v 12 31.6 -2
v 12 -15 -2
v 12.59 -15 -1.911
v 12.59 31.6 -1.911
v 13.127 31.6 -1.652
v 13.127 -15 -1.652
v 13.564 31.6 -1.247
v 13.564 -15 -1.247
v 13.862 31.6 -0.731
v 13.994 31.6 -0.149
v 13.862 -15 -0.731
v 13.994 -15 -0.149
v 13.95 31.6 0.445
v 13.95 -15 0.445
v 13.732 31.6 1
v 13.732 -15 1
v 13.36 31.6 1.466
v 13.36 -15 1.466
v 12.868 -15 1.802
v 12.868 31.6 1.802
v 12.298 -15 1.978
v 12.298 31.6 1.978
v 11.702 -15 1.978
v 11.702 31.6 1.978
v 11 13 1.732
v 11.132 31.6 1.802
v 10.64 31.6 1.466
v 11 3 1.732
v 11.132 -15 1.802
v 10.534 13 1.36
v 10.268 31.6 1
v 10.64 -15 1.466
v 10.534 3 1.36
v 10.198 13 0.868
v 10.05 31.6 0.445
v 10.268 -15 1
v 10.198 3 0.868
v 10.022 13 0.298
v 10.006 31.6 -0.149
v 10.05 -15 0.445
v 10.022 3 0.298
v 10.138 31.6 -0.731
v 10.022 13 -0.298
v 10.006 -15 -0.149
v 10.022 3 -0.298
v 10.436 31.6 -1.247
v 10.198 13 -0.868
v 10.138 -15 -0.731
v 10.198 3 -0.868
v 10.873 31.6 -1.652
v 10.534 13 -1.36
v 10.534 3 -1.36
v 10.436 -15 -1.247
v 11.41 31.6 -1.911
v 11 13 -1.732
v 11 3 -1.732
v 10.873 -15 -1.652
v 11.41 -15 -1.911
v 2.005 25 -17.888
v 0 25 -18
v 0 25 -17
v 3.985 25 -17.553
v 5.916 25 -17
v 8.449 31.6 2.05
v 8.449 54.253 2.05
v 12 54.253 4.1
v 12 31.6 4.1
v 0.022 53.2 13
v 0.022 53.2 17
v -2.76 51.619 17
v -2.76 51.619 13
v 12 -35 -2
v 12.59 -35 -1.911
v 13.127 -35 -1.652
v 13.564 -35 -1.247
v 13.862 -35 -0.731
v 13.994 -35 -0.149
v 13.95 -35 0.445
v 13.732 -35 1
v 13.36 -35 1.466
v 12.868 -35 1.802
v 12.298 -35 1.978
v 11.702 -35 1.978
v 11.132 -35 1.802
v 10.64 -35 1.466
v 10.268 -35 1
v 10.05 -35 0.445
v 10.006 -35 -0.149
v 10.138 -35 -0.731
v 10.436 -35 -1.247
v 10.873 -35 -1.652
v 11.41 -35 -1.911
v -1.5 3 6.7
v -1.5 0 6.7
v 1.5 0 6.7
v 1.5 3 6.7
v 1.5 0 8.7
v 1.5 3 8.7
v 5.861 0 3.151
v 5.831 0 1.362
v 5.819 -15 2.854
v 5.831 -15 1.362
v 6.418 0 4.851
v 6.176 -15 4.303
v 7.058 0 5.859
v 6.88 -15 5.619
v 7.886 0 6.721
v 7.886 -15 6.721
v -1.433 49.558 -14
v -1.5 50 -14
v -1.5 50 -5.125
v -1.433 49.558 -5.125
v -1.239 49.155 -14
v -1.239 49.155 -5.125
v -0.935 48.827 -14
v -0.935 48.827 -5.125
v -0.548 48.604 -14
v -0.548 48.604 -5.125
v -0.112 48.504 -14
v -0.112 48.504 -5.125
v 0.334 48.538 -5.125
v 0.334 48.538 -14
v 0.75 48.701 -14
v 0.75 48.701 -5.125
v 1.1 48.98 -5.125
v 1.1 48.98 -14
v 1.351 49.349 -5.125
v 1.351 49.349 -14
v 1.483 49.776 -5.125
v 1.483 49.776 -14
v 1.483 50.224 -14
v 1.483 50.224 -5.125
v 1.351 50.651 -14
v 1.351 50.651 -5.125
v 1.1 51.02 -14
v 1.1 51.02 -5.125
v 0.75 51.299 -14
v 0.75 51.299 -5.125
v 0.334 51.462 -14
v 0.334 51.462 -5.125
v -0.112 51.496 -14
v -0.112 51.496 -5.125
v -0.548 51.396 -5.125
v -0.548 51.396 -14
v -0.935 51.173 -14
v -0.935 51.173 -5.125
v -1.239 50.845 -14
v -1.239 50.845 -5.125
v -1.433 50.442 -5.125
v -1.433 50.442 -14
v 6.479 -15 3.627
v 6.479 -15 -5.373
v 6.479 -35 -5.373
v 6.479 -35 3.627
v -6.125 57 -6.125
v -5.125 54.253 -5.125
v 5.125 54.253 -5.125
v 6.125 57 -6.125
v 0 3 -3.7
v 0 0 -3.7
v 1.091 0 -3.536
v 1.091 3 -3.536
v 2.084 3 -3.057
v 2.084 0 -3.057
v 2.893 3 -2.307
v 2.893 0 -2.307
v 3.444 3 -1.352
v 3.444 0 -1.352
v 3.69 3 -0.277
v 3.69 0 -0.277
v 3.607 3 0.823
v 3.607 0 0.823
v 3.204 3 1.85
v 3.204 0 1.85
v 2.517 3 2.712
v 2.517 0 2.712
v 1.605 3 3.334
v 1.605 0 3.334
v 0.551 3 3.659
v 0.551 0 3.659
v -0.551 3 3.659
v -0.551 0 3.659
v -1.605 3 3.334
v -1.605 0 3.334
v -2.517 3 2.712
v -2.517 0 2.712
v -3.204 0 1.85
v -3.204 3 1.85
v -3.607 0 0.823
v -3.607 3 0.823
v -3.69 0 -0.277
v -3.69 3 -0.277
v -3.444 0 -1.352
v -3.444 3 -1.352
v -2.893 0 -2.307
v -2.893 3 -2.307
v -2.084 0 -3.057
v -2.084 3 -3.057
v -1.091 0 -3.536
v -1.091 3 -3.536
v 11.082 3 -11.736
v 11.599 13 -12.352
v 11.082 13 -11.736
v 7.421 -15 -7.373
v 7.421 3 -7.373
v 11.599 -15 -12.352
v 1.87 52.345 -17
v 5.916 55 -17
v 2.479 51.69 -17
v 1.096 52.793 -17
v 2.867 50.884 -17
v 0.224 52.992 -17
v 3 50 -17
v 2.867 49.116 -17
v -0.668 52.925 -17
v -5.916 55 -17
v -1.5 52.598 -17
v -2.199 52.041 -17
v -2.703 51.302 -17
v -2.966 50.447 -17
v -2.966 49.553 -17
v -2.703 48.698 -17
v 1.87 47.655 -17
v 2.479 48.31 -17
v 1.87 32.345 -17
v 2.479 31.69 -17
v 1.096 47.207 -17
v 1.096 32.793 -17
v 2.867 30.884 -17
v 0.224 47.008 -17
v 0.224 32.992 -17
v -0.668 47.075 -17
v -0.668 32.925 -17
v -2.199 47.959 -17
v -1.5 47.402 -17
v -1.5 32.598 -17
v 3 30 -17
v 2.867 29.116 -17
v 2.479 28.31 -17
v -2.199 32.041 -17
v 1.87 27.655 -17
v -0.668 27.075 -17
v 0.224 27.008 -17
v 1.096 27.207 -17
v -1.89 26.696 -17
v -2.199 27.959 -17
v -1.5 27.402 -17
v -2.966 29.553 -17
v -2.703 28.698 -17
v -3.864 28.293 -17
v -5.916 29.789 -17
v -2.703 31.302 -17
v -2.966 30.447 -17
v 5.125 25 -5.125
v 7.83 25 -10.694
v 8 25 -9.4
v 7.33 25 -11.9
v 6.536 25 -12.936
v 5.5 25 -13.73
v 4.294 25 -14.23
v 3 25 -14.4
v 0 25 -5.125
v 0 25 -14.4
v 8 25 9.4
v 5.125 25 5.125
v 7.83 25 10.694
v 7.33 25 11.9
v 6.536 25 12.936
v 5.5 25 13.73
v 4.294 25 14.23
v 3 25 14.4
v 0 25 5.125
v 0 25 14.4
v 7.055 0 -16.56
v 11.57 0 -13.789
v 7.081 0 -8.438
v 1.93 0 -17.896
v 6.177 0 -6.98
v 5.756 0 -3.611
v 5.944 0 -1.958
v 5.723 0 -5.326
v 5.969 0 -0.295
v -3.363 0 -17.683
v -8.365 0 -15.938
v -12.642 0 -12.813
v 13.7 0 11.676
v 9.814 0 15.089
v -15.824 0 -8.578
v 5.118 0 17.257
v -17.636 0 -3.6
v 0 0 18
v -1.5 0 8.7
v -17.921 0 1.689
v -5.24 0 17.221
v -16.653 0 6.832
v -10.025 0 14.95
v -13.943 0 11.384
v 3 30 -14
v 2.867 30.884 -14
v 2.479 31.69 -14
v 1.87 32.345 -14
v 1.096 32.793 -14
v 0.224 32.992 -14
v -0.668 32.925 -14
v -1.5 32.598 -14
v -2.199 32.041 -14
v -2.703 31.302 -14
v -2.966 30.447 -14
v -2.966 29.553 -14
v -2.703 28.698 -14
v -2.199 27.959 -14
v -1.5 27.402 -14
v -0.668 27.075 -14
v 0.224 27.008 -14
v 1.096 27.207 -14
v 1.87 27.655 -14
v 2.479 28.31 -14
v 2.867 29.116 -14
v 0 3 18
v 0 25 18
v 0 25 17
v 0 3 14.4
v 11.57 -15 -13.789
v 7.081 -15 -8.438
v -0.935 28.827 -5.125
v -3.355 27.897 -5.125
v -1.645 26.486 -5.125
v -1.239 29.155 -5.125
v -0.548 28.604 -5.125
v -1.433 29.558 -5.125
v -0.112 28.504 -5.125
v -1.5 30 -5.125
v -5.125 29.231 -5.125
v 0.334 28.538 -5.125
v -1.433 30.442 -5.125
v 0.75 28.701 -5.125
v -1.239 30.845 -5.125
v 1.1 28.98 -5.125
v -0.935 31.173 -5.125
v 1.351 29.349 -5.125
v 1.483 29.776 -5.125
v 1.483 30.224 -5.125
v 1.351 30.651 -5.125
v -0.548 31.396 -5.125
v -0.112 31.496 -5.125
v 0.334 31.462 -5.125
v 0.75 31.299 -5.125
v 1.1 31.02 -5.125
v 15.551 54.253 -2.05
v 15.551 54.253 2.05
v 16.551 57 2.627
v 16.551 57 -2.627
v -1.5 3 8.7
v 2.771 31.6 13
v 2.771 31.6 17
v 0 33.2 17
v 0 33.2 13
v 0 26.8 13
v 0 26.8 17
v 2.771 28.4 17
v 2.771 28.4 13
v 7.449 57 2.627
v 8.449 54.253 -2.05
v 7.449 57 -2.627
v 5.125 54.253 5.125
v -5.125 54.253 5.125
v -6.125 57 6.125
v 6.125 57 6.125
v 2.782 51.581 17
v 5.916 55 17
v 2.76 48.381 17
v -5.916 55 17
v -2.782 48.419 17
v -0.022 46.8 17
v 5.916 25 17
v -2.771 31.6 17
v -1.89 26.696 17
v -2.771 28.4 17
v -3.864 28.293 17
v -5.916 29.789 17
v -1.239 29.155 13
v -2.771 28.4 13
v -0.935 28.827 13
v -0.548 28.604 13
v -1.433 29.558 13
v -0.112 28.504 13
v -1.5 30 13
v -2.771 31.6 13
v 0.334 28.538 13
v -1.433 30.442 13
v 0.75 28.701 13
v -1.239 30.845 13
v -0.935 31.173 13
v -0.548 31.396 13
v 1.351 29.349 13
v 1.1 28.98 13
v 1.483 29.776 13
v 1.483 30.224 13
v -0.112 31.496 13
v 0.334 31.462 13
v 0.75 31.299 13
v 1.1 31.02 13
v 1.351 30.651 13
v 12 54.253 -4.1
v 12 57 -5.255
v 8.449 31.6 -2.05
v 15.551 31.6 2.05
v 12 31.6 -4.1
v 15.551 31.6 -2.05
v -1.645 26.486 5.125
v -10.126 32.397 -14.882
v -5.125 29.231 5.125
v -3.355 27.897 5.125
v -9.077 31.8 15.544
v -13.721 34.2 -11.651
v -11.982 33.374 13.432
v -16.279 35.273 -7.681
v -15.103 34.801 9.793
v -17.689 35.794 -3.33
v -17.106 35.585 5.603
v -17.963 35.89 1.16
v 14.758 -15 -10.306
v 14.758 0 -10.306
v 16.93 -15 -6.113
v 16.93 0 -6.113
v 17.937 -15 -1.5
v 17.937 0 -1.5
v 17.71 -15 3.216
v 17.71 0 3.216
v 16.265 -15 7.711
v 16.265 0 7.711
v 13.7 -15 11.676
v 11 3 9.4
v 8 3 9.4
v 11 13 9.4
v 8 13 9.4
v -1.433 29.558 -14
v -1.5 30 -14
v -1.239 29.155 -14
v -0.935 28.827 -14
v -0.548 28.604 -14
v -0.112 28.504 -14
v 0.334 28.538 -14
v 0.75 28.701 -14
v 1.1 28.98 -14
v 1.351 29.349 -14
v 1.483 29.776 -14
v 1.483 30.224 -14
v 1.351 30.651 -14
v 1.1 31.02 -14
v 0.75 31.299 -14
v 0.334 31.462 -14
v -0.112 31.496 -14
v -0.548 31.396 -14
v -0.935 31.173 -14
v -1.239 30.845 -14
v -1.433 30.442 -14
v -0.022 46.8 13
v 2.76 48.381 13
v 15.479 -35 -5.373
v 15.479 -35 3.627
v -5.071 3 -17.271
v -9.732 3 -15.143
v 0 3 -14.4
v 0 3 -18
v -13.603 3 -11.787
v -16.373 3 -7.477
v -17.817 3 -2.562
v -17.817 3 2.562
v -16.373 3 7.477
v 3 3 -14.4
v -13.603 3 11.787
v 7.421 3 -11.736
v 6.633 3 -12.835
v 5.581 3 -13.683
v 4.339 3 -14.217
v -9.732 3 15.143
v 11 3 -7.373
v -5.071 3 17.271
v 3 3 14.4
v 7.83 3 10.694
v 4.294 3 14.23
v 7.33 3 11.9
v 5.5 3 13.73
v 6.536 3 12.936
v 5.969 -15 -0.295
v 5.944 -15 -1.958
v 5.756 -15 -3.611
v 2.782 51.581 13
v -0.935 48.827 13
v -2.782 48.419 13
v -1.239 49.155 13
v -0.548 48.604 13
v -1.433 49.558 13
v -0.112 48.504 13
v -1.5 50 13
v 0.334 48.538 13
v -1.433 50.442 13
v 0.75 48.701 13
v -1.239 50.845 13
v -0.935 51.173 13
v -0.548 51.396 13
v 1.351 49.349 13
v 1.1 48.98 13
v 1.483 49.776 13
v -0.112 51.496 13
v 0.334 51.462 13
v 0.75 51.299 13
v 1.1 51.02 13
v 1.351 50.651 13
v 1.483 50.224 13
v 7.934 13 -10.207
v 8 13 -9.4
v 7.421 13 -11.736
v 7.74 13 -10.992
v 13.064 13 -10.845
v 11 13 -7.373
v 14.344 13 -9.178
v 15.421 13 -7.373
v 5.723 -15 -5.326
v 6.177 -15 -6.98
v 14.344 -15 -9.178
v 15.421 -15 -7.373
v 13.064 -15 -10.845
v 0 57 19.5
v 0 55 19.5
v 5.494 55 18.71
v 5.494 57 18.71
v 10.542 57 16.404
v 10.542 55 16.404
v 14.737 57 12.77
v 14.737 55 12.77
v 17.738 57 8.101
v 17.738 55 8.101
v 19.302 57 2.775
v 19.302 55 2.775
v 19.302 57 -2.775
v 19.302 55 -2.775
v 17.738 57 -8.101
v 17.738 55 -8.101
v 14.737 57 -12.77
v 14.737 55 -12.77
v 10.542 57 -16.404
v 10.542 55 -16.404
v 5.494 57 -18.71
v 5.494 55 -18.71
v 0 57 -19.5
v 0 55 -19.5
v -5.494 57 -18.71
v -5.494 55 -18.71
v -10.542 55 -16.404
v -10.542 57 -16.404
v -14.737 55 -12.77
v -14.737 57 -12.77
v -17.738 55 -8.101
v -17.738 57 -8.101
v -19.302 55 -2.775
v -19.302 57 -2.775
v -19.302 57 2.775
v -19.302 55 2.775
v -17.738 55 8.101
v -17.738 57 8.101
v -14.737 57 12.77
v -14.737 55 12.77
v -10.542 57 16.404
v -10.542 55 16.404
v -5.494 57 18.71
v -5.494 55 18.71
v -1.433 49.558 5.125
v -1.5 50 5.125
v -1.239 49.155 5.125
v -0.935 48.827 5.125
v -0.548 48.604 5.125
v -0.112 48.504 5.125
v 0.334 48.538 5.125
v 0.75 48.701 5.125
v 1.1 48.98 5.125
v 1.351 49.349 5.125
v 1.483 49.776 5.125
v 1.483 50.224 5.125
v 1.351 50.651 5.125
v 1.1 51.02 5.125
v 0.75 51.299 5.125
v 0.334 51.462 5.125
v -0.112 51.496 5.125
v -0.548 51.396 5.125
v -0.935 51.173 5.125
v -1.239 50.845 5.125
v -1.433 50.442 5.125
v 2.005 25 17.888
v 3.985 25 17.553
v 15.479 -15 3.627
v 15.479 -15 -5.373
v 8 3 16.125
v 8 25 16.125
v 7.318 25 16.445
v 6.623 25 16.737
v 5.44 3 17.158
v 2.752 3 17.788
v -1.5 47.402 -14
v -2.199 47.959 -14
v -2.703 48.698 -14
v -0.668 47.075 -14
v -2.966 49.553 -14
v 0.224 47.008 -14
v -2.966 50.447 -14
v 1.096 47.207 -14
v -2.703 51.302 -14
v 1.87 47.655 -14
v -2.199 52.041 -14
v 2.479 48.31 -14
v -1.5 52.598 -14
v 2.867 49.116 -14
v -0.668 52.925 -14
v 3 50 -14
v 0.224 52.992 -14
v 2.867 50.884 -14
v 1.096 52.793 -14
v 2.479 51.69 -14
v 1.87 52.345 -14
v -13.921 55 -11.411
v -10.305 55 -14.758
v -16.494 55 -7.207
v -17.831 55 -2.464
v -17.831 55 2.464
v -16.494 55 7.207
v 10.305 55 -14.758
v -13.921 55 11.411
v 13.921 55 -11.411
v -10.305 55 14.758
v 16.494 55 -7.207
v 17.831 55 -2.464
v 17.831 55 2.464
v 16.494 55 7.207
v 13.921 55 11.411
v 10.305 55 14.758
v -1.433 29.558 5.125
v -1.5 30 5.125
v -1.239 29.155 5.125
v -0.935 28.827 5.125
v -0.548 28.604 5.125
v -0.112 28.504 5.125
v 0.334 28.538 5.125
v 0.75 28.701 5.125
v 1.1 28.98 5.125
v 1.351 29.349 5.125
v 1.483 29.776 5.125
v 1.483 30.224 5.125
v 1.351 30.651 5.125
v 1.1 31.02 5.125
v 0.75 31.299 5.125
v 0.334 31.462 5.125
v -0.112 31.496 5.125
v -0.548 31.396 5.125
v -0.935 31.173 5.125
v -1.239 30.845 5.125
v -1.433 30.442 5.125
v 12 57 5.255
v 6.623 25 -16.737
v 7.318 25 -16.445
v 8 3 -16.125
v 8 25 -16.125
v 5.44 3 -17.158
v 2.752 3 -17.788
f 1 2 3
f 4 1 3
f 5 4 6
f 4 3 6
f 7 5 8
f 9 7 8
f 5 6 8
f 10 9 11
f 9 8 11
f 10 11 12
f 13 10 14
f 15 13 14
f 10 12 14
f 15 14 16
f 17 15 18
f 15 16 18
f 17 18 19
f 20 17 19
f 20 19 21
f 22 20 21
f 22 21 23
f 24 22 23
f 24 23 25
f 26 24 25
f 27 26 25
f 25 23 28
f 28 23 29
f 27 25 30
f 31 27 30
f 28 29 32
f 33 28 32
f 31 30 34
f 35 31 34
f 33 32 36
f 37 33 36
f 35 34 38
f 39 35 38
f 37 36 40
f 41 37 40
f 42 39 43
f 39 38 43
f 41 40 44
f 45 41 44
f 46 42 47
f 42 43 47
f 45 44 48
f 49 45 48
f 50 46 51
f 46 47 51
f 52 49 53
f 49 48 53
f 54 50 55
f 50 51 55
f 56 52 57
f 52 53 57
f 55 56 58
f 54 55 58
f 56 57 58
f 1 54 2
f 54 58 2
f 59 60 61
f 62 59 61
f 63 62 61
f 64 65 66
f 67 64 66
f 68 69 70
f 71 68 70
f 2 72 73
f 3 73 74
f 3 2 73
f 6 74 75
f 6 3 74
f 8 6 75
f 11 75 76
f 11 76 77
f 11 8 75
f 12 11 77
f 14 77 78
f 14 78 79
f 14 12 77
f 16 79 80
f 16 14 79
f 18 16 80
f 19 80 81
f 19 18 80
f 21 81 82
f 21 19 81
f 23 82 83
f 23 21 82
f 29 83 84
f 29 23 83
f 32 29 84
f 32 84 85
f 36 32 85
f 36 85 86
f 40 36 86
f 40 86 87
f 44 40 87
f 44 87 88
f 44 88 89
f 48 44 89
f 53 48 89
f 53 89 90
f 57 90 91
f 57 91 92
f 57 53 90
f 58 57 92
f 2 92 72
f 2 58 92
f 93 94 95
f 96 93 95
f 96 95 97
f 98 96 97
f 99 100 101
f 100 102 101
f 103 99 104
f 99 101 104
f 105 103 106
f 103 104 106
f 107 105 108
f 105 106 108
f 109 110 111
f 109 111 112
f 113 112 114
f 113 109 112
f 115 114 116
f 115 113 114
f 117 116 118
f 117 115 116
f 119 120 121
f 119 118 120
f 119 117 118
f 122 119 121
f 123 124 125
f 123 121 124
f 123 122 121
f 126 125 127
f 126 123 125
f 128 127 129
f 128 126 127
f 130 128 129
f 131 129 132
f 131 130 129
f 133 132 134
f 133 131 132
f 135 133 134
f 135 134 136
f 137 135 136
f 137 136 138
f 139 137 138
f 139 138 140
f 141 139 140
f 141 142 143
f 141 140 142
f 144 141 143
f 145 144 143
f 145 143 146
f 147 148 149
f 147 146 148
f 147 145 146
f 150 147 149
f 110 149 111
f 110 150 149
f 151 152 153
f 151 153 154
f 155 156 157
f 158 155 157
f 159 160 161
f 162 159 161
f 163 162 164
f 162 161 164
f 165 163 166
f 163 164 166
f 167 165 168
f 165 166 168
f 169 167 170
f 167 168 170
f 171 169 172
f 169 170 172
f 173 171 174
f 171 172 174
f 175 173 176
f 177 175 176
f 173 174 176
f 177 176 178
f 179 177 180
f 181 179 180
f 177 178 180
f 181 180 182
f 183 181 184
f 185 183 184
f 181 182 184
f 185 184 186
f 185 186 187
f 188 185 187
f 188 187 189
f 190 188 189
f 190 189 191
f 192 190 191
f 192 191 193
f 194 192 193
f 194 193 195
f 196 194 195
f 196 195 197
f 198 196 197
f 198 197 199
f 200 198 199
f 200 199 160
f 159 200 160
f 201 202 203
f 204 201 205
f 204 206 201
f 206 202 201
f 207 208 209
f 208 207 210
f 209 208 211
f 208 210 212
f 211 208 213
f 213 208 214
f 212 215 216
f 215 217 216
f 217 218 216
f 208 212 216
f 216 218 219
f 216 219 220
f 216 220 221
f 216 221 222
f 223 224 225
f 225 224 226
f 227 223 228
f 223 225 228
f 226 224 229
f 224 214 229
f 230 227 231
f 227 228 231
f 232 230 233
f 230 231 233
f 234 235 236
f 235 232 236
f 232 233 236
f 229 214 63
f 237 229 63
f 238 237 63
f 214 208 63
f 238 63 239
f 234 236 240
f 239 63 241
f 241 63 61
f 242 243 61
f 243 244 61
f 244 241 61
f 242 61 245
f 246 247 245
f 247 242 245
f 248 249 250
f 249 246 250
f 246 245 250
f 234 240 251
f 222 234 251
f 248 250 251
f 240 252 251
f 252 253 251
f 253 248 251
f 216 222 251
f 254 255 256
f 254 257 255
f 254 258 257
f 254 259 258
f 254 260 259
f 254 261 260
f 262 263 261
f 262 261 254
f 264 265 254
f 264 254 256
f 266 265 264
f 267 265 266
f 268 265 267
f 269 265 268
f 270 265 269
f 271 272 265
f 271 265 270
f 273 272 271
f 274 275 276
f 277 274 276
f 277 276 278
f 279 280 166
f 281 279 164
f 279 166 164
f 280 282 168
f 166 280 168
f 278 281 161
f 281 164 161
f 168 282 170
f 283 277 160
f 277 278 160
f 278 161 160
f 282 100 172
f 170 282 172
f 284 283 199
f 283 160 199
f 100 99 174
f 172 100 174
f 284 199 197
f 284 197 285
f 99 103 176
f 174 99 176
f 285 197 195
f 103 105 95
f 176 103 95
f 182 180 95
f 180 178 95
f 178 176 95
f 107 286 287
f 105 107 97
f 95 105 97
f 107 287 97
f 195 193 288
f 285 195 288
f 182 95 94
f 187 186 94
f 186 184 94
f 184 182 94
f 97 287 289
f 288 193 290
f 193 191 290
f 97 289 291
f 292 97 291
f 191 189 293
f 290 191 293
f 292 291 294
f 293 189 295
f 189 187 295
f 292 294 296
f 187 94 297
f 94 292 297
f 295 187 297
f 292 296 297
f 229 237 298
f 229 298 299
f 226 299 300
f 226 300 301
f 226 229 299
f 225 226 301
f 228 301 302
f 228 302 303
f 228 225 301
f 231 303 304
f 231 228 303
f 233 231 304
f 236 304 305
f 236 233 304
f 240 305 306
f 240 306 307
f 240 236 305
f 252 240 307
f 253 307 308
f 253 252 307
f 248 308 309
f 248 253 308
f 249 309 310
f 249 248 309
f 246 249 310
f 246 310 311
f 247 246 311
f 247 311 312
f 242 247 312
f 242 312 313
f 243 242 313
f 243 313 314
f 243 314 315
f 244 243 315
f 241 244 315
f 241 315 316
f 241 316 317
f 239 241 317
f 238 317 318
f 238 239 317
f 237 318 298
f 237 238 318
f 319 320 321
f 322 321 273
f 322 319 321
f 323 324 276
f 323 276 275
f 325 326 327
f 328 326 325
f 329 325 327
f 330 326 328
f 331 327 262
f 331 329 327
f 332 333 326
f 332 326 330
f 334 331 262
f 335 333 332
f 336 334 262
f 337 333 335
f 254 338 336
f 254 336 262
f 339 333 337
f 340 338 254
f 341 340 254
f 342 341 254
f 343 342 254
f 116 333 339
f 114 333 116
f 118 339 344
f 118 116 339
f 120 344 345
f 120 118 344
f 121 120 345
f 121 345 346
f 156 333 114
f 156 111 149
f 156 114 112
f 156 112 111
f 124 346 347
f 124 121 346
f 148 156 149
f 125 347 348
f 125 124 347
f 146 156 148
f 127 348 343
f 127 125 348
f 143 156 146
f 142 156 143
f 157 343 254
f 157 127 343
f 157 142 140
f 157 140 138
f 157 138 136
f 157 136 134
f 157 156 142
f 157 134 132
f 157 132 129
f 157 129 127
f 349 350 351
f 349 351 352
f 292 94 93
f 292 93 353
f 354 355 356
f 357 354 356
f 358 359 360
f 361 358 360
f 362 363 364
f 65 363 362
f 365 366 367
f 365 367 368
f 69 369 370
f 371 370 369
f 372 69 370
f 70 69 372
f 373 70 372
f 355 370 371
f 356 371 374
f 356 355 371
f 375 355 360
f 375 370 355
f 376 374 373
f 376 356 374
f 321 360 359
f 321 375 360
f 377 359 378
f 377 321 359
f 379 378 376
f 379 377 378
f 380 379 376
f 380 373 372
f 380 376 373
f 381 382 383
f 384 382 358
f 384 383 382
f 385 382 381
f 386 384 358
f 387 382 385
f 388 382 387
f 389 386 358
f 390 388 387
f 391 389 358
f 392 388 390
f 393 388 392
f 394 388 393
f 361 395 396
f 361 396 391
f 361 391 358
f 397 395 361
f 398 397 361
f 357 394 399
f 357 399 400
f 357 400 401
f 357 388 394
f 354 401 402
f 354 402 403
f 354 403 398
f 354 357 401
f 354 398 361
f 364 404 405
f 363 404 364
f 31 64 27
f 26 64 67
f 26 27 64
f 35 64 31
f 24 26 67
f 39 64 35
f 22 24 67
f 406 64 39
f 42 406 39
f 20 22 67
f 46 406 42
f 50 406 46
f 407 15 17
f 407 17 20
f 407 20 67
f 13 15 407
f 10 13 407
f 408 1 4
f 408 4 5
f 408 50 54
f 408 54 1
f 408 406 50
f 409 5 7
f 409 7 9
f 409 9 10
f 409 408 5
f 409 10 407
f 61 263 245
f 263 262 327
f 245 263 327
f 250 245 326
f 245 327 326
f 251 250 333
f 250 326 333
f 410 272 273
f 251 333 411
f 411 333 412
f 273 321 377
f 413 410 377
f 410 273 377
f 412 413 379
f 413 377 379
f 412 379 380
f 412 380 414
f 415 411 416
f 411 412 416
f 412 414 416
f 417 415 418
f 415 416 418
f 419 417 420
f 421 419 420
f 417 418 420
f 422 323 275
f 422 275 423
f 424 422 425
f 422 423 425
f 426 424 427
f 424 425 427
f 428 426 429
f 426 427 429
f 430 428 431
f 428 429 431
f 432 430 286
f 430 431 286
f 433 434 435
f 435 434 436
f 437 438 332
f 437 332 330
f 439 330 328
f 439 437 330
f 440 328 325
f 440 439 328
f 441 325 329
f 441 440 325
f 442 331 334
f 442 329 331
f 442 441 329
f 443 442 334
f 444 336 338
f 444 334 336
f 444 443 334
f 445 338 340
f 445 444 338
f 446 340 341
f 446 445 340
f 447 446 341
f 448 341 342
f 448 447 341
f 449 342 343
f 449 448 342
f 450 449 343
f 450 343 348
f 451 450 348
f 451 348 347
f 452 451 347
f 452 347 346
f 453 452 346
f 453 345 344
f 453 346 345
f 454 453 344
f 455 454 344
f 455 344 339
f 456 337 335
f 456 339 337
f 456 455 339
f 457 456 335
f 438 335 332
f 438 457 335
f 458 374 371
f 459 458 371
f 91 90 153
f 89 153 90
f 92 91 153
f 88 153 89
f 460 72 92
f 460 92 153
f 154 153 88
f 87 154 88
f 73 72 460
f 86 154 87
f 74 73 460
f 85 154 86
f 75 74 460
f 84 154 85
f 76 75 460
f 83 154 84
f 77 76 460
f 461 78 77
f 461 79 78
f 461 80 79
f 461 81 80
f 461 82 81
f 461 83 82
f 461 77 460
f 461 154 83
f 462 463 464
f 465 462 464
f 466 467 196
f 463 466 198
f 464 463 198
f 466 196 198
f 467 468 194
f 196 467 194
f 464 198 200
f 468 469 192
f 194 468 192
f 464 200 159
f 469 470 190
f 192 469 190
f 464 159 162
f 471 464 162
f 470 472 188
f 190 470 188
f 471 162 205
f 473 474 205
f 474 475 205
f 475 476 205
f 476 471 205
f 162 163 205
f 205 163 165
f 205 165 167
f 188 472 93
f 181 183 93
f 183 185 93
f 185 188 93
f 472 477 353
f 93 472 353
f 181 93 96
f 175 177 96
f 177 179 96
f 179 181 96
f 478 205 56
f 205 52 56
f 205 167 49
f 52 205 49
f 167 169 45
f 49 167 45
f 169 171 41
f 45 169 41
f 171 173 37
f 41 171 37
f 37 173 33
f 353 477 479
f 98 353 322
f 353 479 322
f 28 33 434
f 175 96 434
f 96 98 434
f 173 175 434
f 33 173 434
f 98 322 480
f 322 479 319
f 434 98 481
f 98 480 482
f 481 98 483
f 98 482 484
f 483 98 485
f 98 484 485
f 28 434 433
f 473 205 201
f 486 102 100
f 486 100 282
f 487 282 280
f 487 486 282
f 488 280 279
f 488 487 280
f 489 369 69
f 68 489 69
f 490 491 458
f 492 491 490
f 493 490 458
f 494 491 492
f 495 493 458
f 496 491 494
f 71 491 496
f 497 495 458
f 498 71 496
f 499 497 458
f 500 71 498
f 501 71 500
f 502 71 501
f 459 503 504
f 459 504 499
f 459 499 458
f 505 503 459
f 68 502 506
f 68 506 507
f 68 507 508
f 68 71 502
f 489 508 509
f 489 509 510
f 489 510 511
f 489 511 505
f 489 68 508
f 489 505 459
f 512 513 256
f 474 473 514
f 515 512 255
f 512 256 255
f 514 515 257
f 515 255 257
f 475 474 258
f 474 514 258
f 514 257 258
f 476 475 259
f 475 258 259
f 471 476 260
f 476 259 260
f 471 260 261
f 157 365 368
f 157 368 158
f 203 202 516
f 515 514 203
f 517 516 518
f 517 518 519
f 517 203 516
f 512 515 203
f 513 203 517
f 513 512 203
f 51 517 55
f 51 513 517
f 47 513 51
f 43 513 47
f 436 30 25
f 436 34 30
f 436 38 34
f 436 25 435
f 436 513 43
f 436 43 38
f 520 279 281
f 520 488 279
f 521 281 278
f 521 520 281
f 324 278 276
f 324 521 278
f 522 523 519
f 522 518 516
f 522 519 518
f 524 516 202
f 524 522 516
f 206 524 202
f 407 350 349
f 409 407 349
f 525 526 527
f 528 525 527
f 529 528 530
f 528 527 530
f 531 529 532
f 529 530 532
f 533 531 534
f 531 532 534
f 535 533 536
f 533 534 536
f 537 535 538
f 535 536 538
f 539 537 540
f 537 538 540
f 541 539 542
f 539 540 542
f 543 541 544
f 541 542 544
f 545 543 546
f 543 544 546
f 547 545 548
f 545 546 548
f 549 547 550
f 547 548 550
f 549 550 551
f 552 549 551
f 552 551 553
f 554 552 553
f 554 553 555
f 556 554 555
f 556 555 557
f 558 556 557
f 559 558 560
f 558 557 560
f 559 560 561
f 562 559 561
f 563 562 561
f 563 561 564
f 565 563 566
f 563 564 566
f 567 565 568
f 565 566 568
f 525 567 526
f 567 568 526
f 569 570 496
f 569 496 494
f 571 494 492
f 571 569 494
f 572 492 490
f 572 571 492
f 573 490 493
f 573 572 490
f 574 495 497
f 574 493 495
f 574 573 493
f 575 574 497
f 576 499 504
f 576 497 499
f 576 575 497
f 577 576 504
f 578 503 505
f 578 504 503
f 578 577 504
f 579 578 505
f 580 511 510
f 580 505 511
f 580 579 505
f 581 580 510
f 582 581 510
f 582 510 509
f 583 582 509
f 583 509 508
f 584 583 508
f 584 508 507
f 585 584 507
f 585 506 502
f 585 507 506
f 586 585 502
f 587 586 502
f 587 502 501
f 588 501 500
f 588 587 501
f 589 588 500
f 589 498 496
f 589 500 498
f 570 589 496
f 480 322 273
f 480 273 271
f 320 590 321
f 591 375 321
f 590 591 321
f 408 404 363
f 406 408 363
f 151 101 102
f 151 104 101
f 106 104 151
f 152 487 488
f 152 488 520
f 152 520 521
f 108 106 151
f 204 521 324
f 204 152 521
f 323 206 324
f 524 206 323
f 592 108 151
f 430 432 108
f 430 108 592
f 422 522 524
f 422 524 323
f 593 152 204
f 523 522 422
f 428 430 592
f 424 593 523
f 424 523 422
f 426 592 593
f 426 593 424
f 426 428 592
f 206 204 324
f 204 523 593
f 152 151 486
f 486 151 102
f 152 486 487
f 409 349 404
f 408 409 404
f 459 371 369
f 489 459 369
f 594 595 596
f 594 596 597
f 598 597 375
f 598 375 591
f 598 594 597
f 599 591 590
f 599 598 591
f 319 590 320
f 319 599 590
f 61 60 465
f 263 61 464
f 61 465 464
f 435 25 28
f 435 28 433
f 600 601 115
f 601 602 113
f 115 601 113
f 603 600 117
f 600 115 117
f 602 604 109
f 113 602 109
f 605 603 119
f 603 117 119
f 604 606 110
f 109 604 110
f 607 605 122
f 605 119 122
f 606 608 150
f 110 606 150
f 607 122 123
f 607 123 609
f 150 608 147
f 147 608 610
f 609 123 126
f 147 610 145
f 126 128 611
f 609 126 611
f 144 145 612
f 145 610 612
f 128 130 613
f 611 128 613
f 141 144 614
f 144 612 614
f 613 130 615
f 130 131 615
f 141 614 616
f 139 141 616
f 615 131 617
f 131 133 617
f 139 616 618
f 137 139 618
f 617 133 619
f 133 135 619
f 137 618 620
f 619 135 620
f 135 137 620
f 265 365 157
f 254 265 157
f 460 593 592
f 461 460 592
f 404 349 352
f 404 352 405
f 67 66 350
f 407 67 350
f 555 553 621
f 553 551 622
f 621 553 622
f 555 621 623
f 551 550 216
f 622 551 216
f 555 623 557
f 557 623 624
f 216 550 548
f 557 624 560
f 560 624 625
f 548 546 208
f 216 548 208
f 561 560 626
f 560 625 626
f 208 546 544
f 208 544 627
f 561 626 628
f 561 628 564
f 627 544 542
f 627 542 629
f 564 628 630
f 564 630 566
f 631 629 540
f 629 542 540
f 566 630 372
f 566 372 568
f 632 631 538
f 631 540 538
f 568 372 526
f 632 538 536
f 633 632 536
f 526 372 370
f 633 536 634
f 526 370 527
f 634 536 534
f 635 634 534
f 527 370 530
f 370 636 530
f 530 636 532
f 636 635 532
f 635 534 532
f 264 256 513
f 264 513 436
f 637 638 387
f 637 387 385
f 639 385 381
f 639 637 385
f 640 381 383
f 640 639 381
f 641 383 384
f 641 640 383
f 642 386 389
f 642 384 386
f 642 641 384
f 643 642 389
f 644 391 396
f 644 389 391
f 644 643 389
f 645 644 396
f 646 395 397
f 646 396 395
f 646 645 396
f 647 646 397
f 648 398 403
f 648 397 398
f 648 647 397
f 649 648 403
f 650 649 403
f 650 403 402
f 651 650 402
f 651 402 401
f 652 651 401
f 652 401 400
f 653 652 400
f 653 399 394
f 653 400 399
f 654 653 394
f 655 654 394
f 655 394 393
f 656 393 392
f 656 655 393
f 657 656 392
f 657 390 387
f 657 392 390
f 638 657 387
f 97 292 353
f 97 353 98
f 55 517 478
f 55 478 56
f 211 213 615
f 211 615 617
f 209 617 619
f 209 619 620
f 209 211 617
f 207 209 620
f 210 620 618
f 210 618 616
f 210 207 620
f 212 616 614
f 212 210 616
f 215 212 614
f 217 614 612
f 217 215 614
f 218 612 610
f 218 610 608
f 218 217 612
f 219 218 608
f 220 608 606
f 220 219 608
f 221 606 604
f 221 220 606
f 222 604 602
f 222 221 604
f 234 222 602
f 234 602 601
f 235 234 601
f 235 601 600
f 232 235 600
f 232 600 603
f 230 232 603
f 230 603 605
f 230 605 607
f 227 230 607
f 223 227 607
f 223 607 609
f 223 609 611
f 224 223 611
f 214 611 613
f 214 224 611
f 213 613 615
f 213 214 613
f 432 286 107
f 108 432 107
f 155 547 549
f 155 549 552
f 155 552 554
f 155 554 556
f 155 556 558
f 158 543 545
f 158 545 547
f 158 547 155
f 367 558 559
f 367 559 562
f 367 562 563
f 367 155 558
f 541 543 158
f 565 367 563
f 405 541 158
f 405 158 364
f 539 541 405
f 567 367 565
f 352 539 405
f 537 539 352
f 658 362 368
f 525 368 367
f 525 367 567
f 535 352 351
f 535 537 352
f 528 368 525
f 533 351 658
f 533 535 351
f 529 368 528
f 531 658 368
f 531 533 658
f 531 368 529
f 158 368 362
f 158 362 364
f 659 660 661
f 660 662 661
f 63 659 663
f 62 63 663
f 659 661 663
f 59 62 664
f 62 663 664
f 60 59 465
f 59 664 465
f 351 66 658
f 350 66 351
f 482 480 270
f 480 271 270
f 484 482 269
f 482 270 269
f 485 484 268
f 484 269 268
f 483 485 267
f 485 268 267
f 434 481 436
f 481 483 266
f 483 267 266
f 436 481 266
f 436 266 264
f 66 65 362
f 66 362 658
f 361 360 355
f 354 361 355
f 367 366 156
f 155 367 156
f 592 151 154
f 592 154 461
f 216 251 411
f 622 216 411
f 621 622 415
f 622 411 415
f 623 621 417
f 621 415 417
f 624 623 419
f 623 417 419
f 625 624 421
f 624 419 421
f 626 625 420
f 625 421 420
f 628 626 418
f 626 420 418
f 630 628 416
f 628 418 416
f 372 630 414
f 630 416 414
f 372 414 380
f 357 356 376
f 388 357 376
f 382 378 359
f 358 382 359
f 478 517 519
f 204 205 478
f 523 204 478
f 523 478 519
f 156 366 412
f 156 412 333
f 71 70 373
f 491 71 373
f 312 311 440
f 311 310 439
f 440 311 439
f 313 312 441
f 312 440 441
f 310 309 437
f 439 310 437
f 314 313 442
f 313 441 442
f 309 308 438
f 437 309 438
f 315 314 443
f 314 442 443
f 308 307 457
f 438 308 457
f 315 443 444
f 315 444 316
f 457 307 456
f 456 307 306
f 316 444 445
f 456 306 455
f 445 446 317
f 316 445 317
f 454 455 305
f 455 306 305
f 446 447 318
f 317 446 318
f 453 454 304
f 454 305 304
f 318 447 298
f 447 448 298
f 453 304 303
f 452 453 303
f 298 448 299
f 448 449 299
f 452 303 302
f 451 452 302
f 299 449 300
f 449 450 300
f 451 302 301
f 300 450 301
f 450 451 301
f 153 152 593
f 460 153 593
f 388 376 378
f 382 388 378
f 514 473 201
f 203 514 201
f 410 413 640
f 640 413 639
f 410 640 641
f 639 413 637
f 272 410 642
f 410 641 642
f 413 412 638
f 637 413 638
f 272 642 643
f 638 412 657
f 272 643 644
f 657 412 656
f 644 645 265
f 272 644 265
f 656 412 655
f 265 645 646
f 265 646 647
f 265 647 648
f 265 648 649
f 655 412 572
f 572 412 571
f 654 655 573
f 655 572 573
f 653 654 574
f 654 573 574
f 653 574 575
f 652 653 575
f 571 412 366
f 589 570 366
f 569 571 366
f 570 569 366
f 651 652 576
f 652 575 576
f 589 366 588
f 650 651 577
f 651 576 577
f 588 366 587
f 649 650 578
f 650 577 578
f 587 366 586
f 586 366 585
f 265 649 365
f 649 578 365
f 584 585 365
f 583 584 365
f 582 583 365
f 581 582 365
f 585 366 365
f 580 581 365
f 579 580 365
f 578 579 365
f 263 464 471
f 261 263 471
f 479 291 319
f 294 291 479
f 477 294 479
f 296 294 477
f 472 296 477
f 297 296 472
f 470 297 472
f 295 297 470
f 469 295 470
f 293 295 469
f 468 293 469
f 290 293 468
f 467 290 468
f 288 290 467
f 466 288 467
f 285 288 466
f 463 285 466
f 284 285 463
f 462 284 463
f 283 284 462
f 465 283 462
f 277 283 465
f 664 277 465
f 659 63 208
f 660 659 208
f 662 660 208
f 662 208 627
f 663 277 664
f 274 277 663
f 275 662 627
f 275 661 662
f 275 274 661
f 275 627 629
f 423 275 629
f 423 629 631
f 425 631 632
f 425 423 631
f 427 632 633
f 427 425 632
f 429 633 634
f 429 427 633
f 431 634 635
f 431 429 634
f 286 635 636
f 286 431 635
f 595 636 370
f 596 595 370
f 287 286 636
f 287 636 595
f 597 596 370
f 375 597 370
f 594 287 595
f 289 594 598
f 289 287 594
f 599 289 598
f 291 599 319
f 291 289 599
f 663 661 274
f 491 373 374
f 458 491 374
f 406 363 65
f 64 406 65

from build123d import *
from build123d.topology import SkipClean

# Parameters (mm, degrees)
SKETCH_1_R          = 18
EXTRUDE_1_DEPTH     = 55
SKETCH_2_R          = 19.5
EXTRUDE_2_DEPTH     = 2
SKETCH_3_W          = 10.25
SKETCH_3_H          = 10.25
CUT_EXTRUDE_1_DEPTH = 40
EXTRUDE_3_DEPTH     = 15
SKETCH1_R           = 18
BOSS_EXTRUDE1_DEPTH = 20
SKETCH3_R           = 18
BOSS_EXTRUDE2_DEPTH = 7
SKETCH4_W           = 10.2
SKETCH4_H           = 10.2
CUT_EXTRUDE2_DEPTH  = 27
CUT_EXTRUDE4_DEPTH  = 25
BOSS_EXTRUDE3_DEPTH = 3
SKETCH9_W           = 36
SKETCH9_H           = 22
CUT_EXTRUDE5_DEPTH  = 8
SKETCH10_R          = 3.7
SKETCH10_W          = 3
SKETCH10_H          = 2
CUT_EXTRUDE6_DEPTH  = 10
SKETCH11_R          = 2
CUT_EXTRUDE7_DEPTH  = 102
SKETCH15_R          = 18
CUT_EXTRUDE9_DEPTH  = 27
CUT_EXTRUDE11_DEPTH = 30
SKETCH18_R          = 1.5
CUT_EXTRUDE12_DEPTH = 71.437916
SKETCH19_R          = 3
CUT_EXTRUDE13_DEPTH = 3
BOSS_EXTRUDE5_DEPTH = 22
CUT_EXTRUDE16_DEPTH = 4
CUT_EXTRUDE17_DEPTH = 25.4
CUT_EXTRUDE18_DEPTH = 71.437916
FILLET2_R           = 5
SKETCH30_W          = 18.8
SKETCH30_H          = 10
CUT_EXTRUDE20_DEPTH = 3
CHAMFER1_SIZE       = 1
CHAMFER1_SIZE2      = 2.747477
CHAMFER2_SIZE       = 1
CHAMFER2_SIZE2      = 2.747477
SKETCH37_W          = 9
SKETCH37_H          = 9
SKETCH37_R          = 2
BOSS_EXTRUDE7_DEPTH = 20
CUT_EXTRUDE22_DEPTH = 15
CUT_EXTRUDE23_REACH = 79.101
SKETCH40_W          = 4.363156
SKETCH40_H          = 4.363157
CUT_EXTRUDE24_DEPTH = 10
FILLET7_R           = 6


with BuildPart() as part:
    # Эскиз1 → Бобышка-Вытянуть1 (new body)
    with BuildSketch(Plane(origin=(0, 0, 0), x_dir=(1, 0, 0), z_dir=(0, 1, 0))):
        with Locations(Location((0, 0, 0), (0, 0, 270))):
            Circle(SKETCH_1_R)
    extrude(amount=EXTRUDE_1_DEPTH)

    # Эскиз2 → Бобышка-Вытянуть2 (add)
    with BuildSketch(Plane(origin=(0, 55, 0), x_dir=(1, 0, 0), z_dir=(0, 1, 0))):
        with Locations(Location((0, 0, 0), (0, 0, 270))):
            Circle(SKETCH_2_R)
    extrude(amount=EXTRUDE_2_DEPTH)

    # Эскиз3 → Вырез-Вытянуть1 (cut)
    with BuildSketch(Plane(origin=(0, 57, 0), x_dir=(1, 0, 0), z_dir=(0, 1, 0))):
        Rectangle(SKETCH_3_W, SKETCH_3_H)
    extrude(amount=-CUT_EXTRUDE_1_DEPTH, mode=Mode.SUBTRACT)

    # Эскиз4 → Бобышка-Вытянуть3 (add)
    with BuildSketch(Plane.XZ):
        with BuildLine():
            Line((5.142301, -6.128356), (11.570177, -13.7888))
            ThreePointArc((11.570177, -13.7888), (17.937391, -1.5), (13.69962, 11.675633))
            Line((13.69962, 11.675633), (5.142301, 4.382576))
            Line((5.142301, 4.382576), (5.142301, -6.128356))
        make_face()
    extrude(amount=EXTRUDE_3_DEPTH)

    # Sketch1 → Boss-Extrude1 (add)
    with BuildSketch(Plane.XZ.offset(15)):
        with Locations(Location((0, 0, 0), (0, 0, 270))):
            Circle(SKETCH1_R)
    extrude(amount=BOSS_EXTRUDE1_DEPTH)

    # Sketch3 → Boss-Extrude2 (add)
    with BuildSketch(Plane.XZ.offset(35)):
        with Locations(Location((0, 0, 0), (0, 0, 270))):
            Circle(SKETCH3_R)
    extrude(amount=BOSS_EXTRUDE2_DEPTH)

    # Sketch4 → Cut-Extrude2 (cut)
    with BuildSketch(Plane.XZ.offset(42)):
        Rectangle(SKETCH4_W, SKETCH4_H)
    extrude(amount=-CUT_EXTRUDE2_DEPTH, mode=Mode.SUBTRACT)

    # Sketch6 → Cut-Extrude4 (cut)
    with BuildSketch(Plane.XZ):
        with BuildLine():
            Line((0, 18), (0, -18))
            ThreePointArc((0, -18), (-18, 0), (0, 18))
        make_face()
    extrude(amount=-CUT_EXTRUDE4_DEPTH, mode=Mode.SUBTRACT)

    # Sketch8 → Boss-Extrude3 (add)
    with BuildSketch(Plane.XZ):
        with BuildLine():
            Line((0, -18), (0, 18))
            ThreePointArc((0, 18), (-18, 0), (0, -18))
        make_face()
    extrude(amount=-BOSS_EXTRUDE3_DEPTH)

    # Sketch9 → Cut-Extrude5 (cut)
    with BuildSketch(Plane.ZY):
        with Locations((0, 14)):
            Rectangle(SKETCH9_W, SKETCH9_H)
    extrude(amount=-CUT_EXTRUDE5_DEPTH, mode=Mode.SUBTRACT)

    # Sketch10 → Cut-Extrude6 (cut)
    with BuildSketch(Plane.XZ):
        with Locations(Location((0, 0, 0), (0, 0, 270))):
            Circle(SKETCH10_R)
        with Locations((0, 7.7)):
            Rectangle(SKETCH10_W, SKETCH10_H)
    extrude(amount=-CUT_EXTRUDE6_DEPTH, mode=Mode.SUBTRACT)

    # Sketch11 → Cut-Extrude7 (cut)
    with BuildSketch(Plane.XZ.offset(42)):
        with Locations(Location((12, 0, 0), (0, 0, 270))):
            Circle(SKETCH11_R)
    extrude(amount=-CUT_EXTRUDE7_DEPTH, mode=Mode.SUBTRACT)

    # Sketch15 → Cut-Extrude9 (cut)
    with BuildSketch(Plane.XZ.offset(42)):
        with Locations(Location((0, 0, 0), (0, 0, 310))):
            Circle(SKETCH15_R)
    extrude(amount=-CUT_EXTRUDE9_DEPTH, mode=Mode.SUBTRACT)

    # Sketch17 → Cut-Extrude11 (cut)
    with BuildSketch(Plane.XZ.offset(-25)):
        with BuildLine():
            Line((5.91608, -17), (-5.91608, -17))
            ThreePointArc((-5.91608, -17), (0, -18), (5.91608, -17))
        make_face()
        with BuildLine():
            Line((5.91608, 17), (-5.91608, 17))
            ThreePointArc((-5.91608, 17), (0, 18), (5.91608, 17))
        make_face()
    extrude(amount=-CUT_EXTRUDE11_DEPTH, mode=Mode.SUBTRACT)

    # Sketch18 → Cut-Extrude12 (cut, through all)
    with BuildSketch(Plane.XY.offset(-17)):
        with Locations(Location((0, 30, 0), (0, 0, 180))):
            Circle(SKETCH18_R)
        with Locations(Location((0, 50, 0), (0, 0, 180))):
            Circle(SKETCH18_R)
    extrude(amount=CUT_EXTRUDE12_DEPTH, mode=Mode.SUBTRACT)

    # Sketch19 → Cut-Extrude13 (cut)
    with BuildSketch(Plane.XY.offset(-17)):
        with Locations((0, 30)):
            Circle(SKETCH19_R)
        with Locations((0, 50)):
            Circle(SKETCH19_R)
    extrude(amount=CUT_EXTRUDE13_DEPTH, mode=Mode.SUBTRACT)

    # Sketch23 → Boss-Extrude5 (add)
    with BuildSketch(Plane(origin=(0, 3, 0), x_dir=(1, 0, 0), z_dir=(0, 1, 0))):
        with BuildLine():
            Line((0, -14.4), (8, -14.4))
            Line((8, -14.4), (8, -16.124515))
            ThreePointArc((8, -16.124515), (4.10845, -17.524858), (0, -18))
            Line((0, -18), (0, -14.4))
        make_face()
        with BuildLine():
            Line((0, 14.4), (8, 14.4))
            Line((8, 14.4), (8, 16.124515))
            ThreePointArc((8, 16.124515), (4.10845, 17.524858), (0, 18))
            Line((0, 18), (0, 14.4))
        make_face()
    extrude(amount=BOSS_EXTRUDE5_DEPTH)

    # Sketch25 → Cut-Extrude16 (cut)
    with BuildSketch(Plane.XY.offset(17)):
        Polygon((2.771281, 28.4), (2.771281, 31.6), (0, 33.2), (-2.771281, 31.6), (-2.771281, 28.4), (0, 26.8), align=None)
        Polygon((-2.782127, 48.418934), (-0.02182, 46.800074), (2.760307, 48.38114), (2.782127, 51.581066), (0.02182, 53.199926), (-2.760307, 51.61886), align=None)
    extrude(amount=-CUT_EXTRUDE16_DEPTH, mode=Mode.SUBTRACT)

    # Sketch26 → Cut-Extrude17 (cut)
    with BuildSketch(Plane(origin=(0, 57, 0), x_dir=(1, 0, 0), z_dir=(0, 1, 0))):
        Polygon((8.449296, -2.05), (12, -4.1), (15.550704, -2.05), (15.550704, 2.05), (12, 4.1), (8.449296, 2.05), align=None)
    extrude(amount=-CUT_EXTRUDE17_DEPTH, mode=Mode.SUBTRACT)

    # Sketch27 → Cut-Extrude18 (cut, through all)
    with BuildSketch(Plane.XY.offset(17)):
        with BuildLine():
            Line((-20, 36.547005), (-20, 25))
            Line((-20, 25), (0, 25))
            ThreePointArc((0, 25), (-9.324199, 31.944024), (-20, 36.547005))
        make_face()
    extrude(amount=-CUT_EXTRUDE18_DEPTH, mode=Mode.SUBTRACT)

    # Fillet2
    fillet2_edges = [part.edges().sort_by_distance(p)[0] for p in [
        (8, 14, -14.4),
        (8, 14, 14.4),
    ]]
    fillet(fillet2_edges, radius=FILLET2_R)

    # Sketch30 → Cut-Extrude20 (cut)
    with BuildSketch(Plane.ZY.offset(-8)):
        with Locations((0, 8)):
            Rectangle(SKETCH30_W, SKETCH30_H)
    extrude(amount=-CUT_EXTRUDE20_DEPTH, mode=Mode.SUBTRACT)

    # Chamfer1
    chamfer1_edges = [part.edges().sort_by_distance(p)[0] for p in [
        (5.125, 57, 0),
        (0, 57, -5.125),
        (-5.125, 57, 0),
        (0, 57, 5.125),
    ]]
    chamfer1_side = [part.faces().sort_by_distance(p)[0] for p in [
        (0, 57, -18.948457),
    ]]
    chamfer(chamfer1_edges, length=CHAMFER1_SIZE, length2=CHAMFER1_SIZE2, reference=chamfer1_side[0])

    # Chamfer2
    chamfer2_edges = [part.edges().sort_by_distance(p)[0] for p in [
        (8.449296, 57, 0),
        (10.224648, 57, 3.075),
        (13.775352, 57, 3.075),
        (15.550704, 57, 0),
        (13.775352, 57, -3.075),
        (10.224648, 57, -3.075),
    ]]
    chamfer2_side = [part.faces().sort_by_distance(p)[0] for p in [
        (6.676543, 57, 0),
    ]]
    chamfer(chamfer2_edges, length=CHAMFER2_SIZE, length2=CHAMFER2_SIZE2, reference=chamfer2_side[0])

    # Sketch37 → Boss-Extrude7 (add)
    with SkipClean():  # the faces are left unmerged after this step: merging them gives an invalid solid
        with BuildSketch(Plane.XZ.offset(15)):
            with Locations((10.978823, -0.87289)):
                Rectangle(SKETCH37_W, SKETCH37_H)
            with Locations(Location((12, 0, 0), (0, 0, 270))):
                Circle(SKETCH37_R, mode=Mode.SUBTRACT)
        extrude(amount=BOSS_EXTRUDE7_DEPTH)

    # Sketch38 → Cut-Extrude22 (cut)
    with SkipClean():  # the faces are left unmerged after this step: merging them gives an invalid solid
        with BuildSketch(Plane.XZ.offset(15)):
            with BuildLine():
                Line((5.142301, -6.128356), (5.142301, 4.382576))
                ThreePointArc((5.142301, 4.382576), (5.978823, -0.87289), (5.142301, -6.128356))
            make_face()
        extrude(amount=-CUT_EXTRUDE22_DEPTH, mode=Mode.SUBTRACT)

    # Cut-Extrude23: up to this face of the body (flat: up to its plane)
    cut_extrude23_end = Plane(part.part.faces().sort_by_distance((9.45036, 13, 0))[0])
    # Sketch39 → Cut-Extrude23 (cut, up to the picked face)
    with BuildSketch(Plane.XZ.offset(15), mode=Mode.PRIVATE) as cut_extrude23_sk1:
        with BuildLine():
            Line((7.420734, -7.37289), (15.420734, -7.37289))
            ThreePointArc((15.420734, -7.37289), (13.728515, -10.030416), (11.598853, -12.352179))
            Line((11.598853, -12.352179), (7.420734, -7.37289))
        make_face()
    cut_extrude23_tool1 = split(extrude(cut_extrude23_sk1.sketch, amount=-CUT_EXTRUDE23_REACH, mode=Mode.PRIVATE), bisect_by=cut_extrude23_end, keep=Keep.BOTH, mode=Mode.PRIVATE)
    add(cut_extrude23_tool1.solids().sort_by(Axis((11.596211, -15, -9.081847), (0, 1, 0)))[0], mode=Mode.SUBTRACT)

    # Sketch40 → Cut-Extrude24 (cut)
    with SkipClean():  # the faces are left unmerged after this step: merging them gives an invalid solid
        with BuildSketch(Plane(origin=(0, 3, 0), x_dir=(1, 0, 0), z_dir=(0, 1, 0))):
            with Locations((9.602312, 9.554468)):
                Rectangle(SKETCH40_W, SKETCH40_H)
        extrude(amount=CUT_EXTRUDE24_DEPTH, mode=Mode.SUBTRACT)

    # Fillet7
    fillet7_edges = [part.edges().sort_by_distance(p)[0] for p in [
        (5.142301, -7.5, 4.382576),
        (5.142301, -7.5, -6.128356),
    ]]
    fillet(fillet7_edges, radius=FILLET7_R)


solid = part.part
